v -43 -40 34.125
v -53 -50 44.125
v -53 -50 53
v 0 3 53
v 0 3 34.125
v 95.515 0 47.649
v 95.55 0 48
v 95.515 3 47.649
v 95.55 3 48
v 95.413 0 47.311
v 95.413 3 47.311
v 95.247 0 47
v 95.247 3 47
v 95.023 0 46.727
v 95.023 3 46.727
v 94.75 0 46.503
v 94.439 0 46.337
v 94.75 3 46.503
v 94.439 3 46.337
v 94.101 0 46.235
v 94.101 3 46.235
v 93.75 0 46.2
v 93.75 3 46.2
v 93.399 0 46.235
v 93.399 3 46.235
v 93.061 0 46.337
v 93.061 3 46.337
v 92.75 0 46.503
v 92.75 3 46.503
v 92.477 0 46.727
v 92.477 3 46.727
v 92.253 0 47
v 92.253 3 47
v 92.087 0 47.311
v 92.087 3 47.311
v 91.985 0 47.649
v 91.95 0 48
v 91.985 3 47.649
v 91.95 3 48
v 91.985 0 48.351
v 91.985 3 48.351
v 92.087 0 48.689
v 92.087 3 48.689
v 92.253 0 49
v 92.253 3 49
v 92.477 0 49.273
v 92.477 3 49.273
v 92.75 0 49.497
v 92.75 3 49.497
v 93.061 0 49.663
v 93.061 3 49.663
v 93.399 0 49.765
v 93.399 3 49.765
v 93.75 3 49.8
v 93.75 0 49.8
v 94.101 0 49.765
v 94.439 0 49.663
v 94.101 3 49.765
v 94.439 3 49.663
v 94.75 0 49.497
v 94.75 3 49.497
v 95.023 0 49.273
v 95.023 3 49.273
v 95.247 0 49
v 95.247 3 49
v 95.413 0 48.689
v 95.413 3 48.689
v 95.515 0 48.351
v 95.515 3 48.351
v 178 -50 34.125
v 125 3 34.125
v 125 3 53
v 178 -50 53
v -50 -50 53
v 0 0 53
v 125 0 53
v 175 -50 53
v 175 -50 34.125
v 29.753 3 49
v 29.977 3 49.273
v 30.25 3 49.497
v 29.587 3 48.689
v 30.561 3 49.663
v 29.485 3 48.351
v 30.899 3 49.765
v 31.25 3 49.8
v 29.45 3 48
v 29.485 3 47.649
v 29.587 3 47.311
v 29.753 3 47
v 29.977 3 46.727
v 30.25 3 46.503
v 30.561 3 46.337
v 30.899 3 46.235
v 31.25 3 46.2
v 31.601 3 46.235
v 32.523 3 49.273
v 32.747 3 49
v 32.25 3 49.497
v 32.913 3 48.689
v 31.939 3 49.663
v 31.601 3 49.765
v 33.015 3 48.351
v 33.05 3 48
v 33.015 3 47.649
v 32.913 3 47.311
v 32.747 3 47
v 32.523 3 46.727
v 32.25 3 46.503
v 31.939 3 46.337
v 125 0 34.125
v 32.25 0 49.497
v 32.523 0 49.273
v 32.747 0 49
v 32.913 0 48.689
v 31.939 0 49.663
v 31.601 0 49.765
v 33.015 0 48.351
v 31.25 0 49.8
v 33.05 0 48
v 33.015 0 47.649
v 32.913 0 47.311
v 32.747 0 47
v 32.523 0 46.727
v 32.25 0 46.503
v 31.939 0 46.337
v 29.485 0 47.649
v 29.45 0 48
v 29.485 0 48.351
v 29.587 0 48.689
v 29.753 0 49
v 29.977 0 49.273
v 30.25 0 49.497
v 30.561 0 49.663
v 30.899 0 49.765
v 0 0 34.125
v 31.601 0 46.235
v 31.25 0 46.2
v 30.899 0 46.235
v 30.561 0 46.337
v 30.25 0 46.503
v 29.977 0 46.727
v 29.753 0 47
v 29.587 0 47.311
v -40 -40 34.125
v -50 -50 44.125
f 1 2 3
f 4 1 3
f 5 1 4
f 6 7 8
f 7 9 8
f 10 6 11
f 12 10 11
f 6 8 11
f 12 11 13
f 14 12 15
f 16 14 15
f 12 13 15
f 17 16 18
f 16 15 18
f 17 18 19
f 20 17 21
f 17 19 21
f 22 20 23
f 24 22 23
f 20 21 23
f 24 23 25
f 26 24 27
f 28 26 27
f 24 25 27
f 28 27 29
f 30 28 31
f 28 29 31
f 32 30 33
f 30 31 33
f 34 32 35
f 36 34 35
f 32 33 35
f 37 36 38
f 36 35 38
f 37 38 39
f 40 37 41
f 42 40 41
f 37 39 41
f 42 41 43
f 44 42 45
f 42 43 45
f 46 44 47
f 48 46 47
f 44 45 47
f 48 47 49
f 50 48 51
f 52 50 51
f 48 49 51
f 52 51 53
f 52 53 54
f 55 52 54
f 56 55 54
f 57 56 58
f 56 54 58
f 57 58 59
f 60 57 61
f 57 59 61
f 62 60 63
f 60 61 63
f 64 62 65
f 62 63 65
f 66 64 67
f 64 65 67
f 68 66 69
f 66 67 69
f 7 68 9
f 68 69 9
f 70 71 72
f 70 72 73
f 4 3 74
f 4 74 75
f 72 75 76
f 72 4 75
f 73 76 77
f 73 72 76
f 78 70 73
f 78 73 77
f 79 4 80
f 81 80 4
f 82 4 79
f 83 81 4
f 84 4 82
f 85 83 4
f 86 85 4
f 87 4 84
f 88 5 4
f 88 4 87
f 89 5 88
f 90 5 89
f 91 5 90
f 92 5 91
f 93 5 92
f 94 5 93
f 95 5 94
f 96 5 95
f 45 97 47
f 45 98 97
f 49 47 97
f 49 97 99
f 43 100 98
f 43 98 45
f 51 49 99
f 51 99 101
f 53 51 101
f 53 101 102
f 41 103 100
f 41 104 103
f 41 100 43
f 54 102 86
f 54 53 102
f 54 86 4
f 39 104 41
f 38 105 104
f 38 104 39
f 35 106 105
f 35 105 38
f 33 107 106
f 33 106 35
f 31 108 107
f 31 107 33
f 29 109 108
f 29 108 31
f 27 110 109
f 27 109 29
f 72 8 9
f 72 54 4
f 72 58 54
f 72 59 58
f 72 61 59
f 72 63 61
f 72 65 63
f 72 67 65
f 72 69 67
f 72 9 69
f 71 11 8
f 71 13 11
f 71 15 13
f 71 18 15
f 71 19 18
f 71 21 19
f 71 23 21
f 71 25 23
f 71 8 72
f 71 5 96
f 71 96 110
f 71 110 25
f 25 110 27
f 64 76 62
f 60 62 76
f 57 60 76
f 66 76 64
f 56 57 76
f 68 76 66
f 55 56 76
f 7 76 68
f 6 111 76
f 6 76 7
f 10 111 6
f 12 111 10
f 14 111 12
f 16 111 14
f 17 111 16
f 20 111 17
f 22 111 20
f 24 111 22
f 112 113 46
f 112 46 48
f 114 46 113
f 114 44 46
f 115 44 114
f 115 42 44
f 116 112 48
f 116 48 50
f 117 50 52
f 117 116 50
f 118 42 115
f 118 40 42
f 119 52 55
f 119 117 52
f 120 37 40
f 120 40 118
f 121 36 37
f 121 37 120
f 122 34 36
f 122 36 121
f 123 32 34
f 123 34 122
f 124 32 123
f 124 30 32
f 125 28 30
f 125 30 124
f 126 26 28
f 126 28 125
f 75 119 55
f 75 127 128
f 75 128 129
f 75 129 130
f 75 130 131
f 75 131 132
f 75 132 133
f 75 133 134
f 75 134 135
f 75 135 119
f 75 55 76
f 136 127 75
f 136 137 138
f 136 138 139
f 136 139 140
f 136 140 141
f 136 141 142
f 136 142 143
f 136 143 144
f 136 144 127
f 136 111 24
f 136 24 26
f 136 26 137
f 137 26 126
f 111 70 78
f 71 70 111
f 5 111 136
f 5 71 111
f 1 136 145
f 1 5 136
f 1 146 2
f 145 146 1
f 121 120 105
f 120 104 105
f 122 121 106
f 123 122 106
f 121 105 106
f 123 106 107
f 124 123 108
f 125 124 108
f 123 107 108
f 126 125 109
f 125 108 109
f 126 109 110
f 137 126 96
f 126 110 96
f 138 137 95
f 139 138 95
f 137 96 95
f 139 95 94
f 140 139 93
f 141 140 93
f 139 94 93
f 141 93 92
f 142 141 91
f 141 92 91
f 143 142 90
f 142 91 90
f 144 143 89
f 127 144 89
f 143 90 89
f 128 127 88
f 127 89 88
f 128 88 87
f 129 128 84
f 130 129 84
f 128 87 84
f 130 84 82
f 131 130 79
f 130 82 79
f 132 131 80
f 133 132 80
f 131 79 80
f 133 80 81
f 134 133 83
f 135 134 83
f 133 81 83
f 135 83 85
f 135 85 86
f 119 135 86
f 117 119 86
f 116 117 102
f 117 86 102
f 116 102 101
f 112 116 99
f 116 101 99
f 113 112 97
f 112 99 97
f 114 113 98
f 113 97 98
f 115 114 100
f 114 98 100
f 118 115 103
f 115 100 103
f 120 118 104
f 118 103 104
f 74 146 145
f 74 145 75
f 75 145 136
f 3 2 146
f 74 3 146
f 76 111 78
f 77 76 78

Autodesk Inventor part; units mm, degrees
ref_plane "YZ Plane" through (0, 0, 0) normal (1, 0, 0) x (0, 1, 0)
ref_plane "XZ Plane" through (0, 0, 0) normal (0, 1, 0) x (-1, 0, 0)
ref_plane "XY Plane" through (0, 0, 0) normal (0, 0, 1) x (1, 0, 0)
sketch "Sketch1" plane through (0, 0, 0) normal (0, 0, 1) x (1, 0, 0)
  line L0 (-50, -50) -> (0, 0)
  line L1 (125, 0) -> (0, 0)
  line L2 (125, 0) -> (175, -50)
  line L3 (178, -50) -> (175, -50)
  line L4 (-53, -50) -> (-50, -50)
  circle A0 centre (117.5, -37.5) radius 1.5
  arc A1 (114.25, -43.8002) -> (114.25, -56.1998) centre (117.5, -50) ccw
  arc A2 (120.75, -56.1998) -> (120.75, -43.8002) centre (117.5, -50) ccw
  line L5 (-53, -50) -> (0, 3)
  line L6 (0, 3) -> (125, 3)
  line L7 (125, 3) -> (178, -50)
extrude "Extrusion1" add sketch "Sketch1" along normal blind 53 contours L4 L5 L6 L7 L3 L2 L1 L0
sketch "Sketch2" plane through (0, 3, 0) normal (0, 1, 0) x (1, 0, 0)
  line L0 (0, -43) -> (125, -43)
  line L1 (125, -53) -> (0, -53)
  circle A0 centre (31.25, -48) radius 1.8
  circle A1 centre (93.75, -48) radius 1.8
  line L2 (-53, -10.625) -> (-53, -53)
  line L3 (-53, -53) -> (-50, -53)
  line L4 (-50, -53) -> (0, -53)
  line L5 (0, 0) -> (-53, 0) projected
  line L6 (-53, 0) -> (-53, -53) projected
  line L7 (0, -53) -> (-53, -53) projected
  line L8 (0, 0) -> (0, -53) projected
  circle A2 centre (31.25, -48) radius 1.6
  circle A3 centre (93.75, -48) radius 1.6
  dimension "d2" = 3.2
  dimension "d3" = 3.2
extrude "Extrusion2" cut sketch "Sketch2" against normal up to surface (3 mm away) contours A0 | A1 | A2 | A3
sketch "Sketch3" plane through (0, 0, 0) normal (0, 0, -1) x (-1, 0, 0)
  line L0 (0, 3) -> (53, -50) projected
  line L1 (-125, 3) -> (0, 3) projected
  line L2 (-178, -50) -> (-125, 3) projected
  line L3 (-175, -50) -> (-178, -50) projected
  line L4 (-125, 0) -> (-175, -50) projected
  line L5 (0, 0) -> (-125, 0) projected
  line L6 (50, -50) -> (0, 0) projected
  line L7 (53, -50) -> (43, -40) projected
  line L8 (43, -40) -> (40, -40) projected
  line L9 (40, -40) -> (50, -50) projected
  line L10 (50, -50) -> (53, -50) projected
  line L11 (53, -50) -> (50, -50) projected
extrude "Extrusion3" cut sketch "Sketch3" against normal blind 34.125
chamfer "Chamfer2" distance 10 angle 45 1 edges at (-51.5, -50, 34.125)
properties part number "obudowa_górna_krótka" material "ABS Plastic"
